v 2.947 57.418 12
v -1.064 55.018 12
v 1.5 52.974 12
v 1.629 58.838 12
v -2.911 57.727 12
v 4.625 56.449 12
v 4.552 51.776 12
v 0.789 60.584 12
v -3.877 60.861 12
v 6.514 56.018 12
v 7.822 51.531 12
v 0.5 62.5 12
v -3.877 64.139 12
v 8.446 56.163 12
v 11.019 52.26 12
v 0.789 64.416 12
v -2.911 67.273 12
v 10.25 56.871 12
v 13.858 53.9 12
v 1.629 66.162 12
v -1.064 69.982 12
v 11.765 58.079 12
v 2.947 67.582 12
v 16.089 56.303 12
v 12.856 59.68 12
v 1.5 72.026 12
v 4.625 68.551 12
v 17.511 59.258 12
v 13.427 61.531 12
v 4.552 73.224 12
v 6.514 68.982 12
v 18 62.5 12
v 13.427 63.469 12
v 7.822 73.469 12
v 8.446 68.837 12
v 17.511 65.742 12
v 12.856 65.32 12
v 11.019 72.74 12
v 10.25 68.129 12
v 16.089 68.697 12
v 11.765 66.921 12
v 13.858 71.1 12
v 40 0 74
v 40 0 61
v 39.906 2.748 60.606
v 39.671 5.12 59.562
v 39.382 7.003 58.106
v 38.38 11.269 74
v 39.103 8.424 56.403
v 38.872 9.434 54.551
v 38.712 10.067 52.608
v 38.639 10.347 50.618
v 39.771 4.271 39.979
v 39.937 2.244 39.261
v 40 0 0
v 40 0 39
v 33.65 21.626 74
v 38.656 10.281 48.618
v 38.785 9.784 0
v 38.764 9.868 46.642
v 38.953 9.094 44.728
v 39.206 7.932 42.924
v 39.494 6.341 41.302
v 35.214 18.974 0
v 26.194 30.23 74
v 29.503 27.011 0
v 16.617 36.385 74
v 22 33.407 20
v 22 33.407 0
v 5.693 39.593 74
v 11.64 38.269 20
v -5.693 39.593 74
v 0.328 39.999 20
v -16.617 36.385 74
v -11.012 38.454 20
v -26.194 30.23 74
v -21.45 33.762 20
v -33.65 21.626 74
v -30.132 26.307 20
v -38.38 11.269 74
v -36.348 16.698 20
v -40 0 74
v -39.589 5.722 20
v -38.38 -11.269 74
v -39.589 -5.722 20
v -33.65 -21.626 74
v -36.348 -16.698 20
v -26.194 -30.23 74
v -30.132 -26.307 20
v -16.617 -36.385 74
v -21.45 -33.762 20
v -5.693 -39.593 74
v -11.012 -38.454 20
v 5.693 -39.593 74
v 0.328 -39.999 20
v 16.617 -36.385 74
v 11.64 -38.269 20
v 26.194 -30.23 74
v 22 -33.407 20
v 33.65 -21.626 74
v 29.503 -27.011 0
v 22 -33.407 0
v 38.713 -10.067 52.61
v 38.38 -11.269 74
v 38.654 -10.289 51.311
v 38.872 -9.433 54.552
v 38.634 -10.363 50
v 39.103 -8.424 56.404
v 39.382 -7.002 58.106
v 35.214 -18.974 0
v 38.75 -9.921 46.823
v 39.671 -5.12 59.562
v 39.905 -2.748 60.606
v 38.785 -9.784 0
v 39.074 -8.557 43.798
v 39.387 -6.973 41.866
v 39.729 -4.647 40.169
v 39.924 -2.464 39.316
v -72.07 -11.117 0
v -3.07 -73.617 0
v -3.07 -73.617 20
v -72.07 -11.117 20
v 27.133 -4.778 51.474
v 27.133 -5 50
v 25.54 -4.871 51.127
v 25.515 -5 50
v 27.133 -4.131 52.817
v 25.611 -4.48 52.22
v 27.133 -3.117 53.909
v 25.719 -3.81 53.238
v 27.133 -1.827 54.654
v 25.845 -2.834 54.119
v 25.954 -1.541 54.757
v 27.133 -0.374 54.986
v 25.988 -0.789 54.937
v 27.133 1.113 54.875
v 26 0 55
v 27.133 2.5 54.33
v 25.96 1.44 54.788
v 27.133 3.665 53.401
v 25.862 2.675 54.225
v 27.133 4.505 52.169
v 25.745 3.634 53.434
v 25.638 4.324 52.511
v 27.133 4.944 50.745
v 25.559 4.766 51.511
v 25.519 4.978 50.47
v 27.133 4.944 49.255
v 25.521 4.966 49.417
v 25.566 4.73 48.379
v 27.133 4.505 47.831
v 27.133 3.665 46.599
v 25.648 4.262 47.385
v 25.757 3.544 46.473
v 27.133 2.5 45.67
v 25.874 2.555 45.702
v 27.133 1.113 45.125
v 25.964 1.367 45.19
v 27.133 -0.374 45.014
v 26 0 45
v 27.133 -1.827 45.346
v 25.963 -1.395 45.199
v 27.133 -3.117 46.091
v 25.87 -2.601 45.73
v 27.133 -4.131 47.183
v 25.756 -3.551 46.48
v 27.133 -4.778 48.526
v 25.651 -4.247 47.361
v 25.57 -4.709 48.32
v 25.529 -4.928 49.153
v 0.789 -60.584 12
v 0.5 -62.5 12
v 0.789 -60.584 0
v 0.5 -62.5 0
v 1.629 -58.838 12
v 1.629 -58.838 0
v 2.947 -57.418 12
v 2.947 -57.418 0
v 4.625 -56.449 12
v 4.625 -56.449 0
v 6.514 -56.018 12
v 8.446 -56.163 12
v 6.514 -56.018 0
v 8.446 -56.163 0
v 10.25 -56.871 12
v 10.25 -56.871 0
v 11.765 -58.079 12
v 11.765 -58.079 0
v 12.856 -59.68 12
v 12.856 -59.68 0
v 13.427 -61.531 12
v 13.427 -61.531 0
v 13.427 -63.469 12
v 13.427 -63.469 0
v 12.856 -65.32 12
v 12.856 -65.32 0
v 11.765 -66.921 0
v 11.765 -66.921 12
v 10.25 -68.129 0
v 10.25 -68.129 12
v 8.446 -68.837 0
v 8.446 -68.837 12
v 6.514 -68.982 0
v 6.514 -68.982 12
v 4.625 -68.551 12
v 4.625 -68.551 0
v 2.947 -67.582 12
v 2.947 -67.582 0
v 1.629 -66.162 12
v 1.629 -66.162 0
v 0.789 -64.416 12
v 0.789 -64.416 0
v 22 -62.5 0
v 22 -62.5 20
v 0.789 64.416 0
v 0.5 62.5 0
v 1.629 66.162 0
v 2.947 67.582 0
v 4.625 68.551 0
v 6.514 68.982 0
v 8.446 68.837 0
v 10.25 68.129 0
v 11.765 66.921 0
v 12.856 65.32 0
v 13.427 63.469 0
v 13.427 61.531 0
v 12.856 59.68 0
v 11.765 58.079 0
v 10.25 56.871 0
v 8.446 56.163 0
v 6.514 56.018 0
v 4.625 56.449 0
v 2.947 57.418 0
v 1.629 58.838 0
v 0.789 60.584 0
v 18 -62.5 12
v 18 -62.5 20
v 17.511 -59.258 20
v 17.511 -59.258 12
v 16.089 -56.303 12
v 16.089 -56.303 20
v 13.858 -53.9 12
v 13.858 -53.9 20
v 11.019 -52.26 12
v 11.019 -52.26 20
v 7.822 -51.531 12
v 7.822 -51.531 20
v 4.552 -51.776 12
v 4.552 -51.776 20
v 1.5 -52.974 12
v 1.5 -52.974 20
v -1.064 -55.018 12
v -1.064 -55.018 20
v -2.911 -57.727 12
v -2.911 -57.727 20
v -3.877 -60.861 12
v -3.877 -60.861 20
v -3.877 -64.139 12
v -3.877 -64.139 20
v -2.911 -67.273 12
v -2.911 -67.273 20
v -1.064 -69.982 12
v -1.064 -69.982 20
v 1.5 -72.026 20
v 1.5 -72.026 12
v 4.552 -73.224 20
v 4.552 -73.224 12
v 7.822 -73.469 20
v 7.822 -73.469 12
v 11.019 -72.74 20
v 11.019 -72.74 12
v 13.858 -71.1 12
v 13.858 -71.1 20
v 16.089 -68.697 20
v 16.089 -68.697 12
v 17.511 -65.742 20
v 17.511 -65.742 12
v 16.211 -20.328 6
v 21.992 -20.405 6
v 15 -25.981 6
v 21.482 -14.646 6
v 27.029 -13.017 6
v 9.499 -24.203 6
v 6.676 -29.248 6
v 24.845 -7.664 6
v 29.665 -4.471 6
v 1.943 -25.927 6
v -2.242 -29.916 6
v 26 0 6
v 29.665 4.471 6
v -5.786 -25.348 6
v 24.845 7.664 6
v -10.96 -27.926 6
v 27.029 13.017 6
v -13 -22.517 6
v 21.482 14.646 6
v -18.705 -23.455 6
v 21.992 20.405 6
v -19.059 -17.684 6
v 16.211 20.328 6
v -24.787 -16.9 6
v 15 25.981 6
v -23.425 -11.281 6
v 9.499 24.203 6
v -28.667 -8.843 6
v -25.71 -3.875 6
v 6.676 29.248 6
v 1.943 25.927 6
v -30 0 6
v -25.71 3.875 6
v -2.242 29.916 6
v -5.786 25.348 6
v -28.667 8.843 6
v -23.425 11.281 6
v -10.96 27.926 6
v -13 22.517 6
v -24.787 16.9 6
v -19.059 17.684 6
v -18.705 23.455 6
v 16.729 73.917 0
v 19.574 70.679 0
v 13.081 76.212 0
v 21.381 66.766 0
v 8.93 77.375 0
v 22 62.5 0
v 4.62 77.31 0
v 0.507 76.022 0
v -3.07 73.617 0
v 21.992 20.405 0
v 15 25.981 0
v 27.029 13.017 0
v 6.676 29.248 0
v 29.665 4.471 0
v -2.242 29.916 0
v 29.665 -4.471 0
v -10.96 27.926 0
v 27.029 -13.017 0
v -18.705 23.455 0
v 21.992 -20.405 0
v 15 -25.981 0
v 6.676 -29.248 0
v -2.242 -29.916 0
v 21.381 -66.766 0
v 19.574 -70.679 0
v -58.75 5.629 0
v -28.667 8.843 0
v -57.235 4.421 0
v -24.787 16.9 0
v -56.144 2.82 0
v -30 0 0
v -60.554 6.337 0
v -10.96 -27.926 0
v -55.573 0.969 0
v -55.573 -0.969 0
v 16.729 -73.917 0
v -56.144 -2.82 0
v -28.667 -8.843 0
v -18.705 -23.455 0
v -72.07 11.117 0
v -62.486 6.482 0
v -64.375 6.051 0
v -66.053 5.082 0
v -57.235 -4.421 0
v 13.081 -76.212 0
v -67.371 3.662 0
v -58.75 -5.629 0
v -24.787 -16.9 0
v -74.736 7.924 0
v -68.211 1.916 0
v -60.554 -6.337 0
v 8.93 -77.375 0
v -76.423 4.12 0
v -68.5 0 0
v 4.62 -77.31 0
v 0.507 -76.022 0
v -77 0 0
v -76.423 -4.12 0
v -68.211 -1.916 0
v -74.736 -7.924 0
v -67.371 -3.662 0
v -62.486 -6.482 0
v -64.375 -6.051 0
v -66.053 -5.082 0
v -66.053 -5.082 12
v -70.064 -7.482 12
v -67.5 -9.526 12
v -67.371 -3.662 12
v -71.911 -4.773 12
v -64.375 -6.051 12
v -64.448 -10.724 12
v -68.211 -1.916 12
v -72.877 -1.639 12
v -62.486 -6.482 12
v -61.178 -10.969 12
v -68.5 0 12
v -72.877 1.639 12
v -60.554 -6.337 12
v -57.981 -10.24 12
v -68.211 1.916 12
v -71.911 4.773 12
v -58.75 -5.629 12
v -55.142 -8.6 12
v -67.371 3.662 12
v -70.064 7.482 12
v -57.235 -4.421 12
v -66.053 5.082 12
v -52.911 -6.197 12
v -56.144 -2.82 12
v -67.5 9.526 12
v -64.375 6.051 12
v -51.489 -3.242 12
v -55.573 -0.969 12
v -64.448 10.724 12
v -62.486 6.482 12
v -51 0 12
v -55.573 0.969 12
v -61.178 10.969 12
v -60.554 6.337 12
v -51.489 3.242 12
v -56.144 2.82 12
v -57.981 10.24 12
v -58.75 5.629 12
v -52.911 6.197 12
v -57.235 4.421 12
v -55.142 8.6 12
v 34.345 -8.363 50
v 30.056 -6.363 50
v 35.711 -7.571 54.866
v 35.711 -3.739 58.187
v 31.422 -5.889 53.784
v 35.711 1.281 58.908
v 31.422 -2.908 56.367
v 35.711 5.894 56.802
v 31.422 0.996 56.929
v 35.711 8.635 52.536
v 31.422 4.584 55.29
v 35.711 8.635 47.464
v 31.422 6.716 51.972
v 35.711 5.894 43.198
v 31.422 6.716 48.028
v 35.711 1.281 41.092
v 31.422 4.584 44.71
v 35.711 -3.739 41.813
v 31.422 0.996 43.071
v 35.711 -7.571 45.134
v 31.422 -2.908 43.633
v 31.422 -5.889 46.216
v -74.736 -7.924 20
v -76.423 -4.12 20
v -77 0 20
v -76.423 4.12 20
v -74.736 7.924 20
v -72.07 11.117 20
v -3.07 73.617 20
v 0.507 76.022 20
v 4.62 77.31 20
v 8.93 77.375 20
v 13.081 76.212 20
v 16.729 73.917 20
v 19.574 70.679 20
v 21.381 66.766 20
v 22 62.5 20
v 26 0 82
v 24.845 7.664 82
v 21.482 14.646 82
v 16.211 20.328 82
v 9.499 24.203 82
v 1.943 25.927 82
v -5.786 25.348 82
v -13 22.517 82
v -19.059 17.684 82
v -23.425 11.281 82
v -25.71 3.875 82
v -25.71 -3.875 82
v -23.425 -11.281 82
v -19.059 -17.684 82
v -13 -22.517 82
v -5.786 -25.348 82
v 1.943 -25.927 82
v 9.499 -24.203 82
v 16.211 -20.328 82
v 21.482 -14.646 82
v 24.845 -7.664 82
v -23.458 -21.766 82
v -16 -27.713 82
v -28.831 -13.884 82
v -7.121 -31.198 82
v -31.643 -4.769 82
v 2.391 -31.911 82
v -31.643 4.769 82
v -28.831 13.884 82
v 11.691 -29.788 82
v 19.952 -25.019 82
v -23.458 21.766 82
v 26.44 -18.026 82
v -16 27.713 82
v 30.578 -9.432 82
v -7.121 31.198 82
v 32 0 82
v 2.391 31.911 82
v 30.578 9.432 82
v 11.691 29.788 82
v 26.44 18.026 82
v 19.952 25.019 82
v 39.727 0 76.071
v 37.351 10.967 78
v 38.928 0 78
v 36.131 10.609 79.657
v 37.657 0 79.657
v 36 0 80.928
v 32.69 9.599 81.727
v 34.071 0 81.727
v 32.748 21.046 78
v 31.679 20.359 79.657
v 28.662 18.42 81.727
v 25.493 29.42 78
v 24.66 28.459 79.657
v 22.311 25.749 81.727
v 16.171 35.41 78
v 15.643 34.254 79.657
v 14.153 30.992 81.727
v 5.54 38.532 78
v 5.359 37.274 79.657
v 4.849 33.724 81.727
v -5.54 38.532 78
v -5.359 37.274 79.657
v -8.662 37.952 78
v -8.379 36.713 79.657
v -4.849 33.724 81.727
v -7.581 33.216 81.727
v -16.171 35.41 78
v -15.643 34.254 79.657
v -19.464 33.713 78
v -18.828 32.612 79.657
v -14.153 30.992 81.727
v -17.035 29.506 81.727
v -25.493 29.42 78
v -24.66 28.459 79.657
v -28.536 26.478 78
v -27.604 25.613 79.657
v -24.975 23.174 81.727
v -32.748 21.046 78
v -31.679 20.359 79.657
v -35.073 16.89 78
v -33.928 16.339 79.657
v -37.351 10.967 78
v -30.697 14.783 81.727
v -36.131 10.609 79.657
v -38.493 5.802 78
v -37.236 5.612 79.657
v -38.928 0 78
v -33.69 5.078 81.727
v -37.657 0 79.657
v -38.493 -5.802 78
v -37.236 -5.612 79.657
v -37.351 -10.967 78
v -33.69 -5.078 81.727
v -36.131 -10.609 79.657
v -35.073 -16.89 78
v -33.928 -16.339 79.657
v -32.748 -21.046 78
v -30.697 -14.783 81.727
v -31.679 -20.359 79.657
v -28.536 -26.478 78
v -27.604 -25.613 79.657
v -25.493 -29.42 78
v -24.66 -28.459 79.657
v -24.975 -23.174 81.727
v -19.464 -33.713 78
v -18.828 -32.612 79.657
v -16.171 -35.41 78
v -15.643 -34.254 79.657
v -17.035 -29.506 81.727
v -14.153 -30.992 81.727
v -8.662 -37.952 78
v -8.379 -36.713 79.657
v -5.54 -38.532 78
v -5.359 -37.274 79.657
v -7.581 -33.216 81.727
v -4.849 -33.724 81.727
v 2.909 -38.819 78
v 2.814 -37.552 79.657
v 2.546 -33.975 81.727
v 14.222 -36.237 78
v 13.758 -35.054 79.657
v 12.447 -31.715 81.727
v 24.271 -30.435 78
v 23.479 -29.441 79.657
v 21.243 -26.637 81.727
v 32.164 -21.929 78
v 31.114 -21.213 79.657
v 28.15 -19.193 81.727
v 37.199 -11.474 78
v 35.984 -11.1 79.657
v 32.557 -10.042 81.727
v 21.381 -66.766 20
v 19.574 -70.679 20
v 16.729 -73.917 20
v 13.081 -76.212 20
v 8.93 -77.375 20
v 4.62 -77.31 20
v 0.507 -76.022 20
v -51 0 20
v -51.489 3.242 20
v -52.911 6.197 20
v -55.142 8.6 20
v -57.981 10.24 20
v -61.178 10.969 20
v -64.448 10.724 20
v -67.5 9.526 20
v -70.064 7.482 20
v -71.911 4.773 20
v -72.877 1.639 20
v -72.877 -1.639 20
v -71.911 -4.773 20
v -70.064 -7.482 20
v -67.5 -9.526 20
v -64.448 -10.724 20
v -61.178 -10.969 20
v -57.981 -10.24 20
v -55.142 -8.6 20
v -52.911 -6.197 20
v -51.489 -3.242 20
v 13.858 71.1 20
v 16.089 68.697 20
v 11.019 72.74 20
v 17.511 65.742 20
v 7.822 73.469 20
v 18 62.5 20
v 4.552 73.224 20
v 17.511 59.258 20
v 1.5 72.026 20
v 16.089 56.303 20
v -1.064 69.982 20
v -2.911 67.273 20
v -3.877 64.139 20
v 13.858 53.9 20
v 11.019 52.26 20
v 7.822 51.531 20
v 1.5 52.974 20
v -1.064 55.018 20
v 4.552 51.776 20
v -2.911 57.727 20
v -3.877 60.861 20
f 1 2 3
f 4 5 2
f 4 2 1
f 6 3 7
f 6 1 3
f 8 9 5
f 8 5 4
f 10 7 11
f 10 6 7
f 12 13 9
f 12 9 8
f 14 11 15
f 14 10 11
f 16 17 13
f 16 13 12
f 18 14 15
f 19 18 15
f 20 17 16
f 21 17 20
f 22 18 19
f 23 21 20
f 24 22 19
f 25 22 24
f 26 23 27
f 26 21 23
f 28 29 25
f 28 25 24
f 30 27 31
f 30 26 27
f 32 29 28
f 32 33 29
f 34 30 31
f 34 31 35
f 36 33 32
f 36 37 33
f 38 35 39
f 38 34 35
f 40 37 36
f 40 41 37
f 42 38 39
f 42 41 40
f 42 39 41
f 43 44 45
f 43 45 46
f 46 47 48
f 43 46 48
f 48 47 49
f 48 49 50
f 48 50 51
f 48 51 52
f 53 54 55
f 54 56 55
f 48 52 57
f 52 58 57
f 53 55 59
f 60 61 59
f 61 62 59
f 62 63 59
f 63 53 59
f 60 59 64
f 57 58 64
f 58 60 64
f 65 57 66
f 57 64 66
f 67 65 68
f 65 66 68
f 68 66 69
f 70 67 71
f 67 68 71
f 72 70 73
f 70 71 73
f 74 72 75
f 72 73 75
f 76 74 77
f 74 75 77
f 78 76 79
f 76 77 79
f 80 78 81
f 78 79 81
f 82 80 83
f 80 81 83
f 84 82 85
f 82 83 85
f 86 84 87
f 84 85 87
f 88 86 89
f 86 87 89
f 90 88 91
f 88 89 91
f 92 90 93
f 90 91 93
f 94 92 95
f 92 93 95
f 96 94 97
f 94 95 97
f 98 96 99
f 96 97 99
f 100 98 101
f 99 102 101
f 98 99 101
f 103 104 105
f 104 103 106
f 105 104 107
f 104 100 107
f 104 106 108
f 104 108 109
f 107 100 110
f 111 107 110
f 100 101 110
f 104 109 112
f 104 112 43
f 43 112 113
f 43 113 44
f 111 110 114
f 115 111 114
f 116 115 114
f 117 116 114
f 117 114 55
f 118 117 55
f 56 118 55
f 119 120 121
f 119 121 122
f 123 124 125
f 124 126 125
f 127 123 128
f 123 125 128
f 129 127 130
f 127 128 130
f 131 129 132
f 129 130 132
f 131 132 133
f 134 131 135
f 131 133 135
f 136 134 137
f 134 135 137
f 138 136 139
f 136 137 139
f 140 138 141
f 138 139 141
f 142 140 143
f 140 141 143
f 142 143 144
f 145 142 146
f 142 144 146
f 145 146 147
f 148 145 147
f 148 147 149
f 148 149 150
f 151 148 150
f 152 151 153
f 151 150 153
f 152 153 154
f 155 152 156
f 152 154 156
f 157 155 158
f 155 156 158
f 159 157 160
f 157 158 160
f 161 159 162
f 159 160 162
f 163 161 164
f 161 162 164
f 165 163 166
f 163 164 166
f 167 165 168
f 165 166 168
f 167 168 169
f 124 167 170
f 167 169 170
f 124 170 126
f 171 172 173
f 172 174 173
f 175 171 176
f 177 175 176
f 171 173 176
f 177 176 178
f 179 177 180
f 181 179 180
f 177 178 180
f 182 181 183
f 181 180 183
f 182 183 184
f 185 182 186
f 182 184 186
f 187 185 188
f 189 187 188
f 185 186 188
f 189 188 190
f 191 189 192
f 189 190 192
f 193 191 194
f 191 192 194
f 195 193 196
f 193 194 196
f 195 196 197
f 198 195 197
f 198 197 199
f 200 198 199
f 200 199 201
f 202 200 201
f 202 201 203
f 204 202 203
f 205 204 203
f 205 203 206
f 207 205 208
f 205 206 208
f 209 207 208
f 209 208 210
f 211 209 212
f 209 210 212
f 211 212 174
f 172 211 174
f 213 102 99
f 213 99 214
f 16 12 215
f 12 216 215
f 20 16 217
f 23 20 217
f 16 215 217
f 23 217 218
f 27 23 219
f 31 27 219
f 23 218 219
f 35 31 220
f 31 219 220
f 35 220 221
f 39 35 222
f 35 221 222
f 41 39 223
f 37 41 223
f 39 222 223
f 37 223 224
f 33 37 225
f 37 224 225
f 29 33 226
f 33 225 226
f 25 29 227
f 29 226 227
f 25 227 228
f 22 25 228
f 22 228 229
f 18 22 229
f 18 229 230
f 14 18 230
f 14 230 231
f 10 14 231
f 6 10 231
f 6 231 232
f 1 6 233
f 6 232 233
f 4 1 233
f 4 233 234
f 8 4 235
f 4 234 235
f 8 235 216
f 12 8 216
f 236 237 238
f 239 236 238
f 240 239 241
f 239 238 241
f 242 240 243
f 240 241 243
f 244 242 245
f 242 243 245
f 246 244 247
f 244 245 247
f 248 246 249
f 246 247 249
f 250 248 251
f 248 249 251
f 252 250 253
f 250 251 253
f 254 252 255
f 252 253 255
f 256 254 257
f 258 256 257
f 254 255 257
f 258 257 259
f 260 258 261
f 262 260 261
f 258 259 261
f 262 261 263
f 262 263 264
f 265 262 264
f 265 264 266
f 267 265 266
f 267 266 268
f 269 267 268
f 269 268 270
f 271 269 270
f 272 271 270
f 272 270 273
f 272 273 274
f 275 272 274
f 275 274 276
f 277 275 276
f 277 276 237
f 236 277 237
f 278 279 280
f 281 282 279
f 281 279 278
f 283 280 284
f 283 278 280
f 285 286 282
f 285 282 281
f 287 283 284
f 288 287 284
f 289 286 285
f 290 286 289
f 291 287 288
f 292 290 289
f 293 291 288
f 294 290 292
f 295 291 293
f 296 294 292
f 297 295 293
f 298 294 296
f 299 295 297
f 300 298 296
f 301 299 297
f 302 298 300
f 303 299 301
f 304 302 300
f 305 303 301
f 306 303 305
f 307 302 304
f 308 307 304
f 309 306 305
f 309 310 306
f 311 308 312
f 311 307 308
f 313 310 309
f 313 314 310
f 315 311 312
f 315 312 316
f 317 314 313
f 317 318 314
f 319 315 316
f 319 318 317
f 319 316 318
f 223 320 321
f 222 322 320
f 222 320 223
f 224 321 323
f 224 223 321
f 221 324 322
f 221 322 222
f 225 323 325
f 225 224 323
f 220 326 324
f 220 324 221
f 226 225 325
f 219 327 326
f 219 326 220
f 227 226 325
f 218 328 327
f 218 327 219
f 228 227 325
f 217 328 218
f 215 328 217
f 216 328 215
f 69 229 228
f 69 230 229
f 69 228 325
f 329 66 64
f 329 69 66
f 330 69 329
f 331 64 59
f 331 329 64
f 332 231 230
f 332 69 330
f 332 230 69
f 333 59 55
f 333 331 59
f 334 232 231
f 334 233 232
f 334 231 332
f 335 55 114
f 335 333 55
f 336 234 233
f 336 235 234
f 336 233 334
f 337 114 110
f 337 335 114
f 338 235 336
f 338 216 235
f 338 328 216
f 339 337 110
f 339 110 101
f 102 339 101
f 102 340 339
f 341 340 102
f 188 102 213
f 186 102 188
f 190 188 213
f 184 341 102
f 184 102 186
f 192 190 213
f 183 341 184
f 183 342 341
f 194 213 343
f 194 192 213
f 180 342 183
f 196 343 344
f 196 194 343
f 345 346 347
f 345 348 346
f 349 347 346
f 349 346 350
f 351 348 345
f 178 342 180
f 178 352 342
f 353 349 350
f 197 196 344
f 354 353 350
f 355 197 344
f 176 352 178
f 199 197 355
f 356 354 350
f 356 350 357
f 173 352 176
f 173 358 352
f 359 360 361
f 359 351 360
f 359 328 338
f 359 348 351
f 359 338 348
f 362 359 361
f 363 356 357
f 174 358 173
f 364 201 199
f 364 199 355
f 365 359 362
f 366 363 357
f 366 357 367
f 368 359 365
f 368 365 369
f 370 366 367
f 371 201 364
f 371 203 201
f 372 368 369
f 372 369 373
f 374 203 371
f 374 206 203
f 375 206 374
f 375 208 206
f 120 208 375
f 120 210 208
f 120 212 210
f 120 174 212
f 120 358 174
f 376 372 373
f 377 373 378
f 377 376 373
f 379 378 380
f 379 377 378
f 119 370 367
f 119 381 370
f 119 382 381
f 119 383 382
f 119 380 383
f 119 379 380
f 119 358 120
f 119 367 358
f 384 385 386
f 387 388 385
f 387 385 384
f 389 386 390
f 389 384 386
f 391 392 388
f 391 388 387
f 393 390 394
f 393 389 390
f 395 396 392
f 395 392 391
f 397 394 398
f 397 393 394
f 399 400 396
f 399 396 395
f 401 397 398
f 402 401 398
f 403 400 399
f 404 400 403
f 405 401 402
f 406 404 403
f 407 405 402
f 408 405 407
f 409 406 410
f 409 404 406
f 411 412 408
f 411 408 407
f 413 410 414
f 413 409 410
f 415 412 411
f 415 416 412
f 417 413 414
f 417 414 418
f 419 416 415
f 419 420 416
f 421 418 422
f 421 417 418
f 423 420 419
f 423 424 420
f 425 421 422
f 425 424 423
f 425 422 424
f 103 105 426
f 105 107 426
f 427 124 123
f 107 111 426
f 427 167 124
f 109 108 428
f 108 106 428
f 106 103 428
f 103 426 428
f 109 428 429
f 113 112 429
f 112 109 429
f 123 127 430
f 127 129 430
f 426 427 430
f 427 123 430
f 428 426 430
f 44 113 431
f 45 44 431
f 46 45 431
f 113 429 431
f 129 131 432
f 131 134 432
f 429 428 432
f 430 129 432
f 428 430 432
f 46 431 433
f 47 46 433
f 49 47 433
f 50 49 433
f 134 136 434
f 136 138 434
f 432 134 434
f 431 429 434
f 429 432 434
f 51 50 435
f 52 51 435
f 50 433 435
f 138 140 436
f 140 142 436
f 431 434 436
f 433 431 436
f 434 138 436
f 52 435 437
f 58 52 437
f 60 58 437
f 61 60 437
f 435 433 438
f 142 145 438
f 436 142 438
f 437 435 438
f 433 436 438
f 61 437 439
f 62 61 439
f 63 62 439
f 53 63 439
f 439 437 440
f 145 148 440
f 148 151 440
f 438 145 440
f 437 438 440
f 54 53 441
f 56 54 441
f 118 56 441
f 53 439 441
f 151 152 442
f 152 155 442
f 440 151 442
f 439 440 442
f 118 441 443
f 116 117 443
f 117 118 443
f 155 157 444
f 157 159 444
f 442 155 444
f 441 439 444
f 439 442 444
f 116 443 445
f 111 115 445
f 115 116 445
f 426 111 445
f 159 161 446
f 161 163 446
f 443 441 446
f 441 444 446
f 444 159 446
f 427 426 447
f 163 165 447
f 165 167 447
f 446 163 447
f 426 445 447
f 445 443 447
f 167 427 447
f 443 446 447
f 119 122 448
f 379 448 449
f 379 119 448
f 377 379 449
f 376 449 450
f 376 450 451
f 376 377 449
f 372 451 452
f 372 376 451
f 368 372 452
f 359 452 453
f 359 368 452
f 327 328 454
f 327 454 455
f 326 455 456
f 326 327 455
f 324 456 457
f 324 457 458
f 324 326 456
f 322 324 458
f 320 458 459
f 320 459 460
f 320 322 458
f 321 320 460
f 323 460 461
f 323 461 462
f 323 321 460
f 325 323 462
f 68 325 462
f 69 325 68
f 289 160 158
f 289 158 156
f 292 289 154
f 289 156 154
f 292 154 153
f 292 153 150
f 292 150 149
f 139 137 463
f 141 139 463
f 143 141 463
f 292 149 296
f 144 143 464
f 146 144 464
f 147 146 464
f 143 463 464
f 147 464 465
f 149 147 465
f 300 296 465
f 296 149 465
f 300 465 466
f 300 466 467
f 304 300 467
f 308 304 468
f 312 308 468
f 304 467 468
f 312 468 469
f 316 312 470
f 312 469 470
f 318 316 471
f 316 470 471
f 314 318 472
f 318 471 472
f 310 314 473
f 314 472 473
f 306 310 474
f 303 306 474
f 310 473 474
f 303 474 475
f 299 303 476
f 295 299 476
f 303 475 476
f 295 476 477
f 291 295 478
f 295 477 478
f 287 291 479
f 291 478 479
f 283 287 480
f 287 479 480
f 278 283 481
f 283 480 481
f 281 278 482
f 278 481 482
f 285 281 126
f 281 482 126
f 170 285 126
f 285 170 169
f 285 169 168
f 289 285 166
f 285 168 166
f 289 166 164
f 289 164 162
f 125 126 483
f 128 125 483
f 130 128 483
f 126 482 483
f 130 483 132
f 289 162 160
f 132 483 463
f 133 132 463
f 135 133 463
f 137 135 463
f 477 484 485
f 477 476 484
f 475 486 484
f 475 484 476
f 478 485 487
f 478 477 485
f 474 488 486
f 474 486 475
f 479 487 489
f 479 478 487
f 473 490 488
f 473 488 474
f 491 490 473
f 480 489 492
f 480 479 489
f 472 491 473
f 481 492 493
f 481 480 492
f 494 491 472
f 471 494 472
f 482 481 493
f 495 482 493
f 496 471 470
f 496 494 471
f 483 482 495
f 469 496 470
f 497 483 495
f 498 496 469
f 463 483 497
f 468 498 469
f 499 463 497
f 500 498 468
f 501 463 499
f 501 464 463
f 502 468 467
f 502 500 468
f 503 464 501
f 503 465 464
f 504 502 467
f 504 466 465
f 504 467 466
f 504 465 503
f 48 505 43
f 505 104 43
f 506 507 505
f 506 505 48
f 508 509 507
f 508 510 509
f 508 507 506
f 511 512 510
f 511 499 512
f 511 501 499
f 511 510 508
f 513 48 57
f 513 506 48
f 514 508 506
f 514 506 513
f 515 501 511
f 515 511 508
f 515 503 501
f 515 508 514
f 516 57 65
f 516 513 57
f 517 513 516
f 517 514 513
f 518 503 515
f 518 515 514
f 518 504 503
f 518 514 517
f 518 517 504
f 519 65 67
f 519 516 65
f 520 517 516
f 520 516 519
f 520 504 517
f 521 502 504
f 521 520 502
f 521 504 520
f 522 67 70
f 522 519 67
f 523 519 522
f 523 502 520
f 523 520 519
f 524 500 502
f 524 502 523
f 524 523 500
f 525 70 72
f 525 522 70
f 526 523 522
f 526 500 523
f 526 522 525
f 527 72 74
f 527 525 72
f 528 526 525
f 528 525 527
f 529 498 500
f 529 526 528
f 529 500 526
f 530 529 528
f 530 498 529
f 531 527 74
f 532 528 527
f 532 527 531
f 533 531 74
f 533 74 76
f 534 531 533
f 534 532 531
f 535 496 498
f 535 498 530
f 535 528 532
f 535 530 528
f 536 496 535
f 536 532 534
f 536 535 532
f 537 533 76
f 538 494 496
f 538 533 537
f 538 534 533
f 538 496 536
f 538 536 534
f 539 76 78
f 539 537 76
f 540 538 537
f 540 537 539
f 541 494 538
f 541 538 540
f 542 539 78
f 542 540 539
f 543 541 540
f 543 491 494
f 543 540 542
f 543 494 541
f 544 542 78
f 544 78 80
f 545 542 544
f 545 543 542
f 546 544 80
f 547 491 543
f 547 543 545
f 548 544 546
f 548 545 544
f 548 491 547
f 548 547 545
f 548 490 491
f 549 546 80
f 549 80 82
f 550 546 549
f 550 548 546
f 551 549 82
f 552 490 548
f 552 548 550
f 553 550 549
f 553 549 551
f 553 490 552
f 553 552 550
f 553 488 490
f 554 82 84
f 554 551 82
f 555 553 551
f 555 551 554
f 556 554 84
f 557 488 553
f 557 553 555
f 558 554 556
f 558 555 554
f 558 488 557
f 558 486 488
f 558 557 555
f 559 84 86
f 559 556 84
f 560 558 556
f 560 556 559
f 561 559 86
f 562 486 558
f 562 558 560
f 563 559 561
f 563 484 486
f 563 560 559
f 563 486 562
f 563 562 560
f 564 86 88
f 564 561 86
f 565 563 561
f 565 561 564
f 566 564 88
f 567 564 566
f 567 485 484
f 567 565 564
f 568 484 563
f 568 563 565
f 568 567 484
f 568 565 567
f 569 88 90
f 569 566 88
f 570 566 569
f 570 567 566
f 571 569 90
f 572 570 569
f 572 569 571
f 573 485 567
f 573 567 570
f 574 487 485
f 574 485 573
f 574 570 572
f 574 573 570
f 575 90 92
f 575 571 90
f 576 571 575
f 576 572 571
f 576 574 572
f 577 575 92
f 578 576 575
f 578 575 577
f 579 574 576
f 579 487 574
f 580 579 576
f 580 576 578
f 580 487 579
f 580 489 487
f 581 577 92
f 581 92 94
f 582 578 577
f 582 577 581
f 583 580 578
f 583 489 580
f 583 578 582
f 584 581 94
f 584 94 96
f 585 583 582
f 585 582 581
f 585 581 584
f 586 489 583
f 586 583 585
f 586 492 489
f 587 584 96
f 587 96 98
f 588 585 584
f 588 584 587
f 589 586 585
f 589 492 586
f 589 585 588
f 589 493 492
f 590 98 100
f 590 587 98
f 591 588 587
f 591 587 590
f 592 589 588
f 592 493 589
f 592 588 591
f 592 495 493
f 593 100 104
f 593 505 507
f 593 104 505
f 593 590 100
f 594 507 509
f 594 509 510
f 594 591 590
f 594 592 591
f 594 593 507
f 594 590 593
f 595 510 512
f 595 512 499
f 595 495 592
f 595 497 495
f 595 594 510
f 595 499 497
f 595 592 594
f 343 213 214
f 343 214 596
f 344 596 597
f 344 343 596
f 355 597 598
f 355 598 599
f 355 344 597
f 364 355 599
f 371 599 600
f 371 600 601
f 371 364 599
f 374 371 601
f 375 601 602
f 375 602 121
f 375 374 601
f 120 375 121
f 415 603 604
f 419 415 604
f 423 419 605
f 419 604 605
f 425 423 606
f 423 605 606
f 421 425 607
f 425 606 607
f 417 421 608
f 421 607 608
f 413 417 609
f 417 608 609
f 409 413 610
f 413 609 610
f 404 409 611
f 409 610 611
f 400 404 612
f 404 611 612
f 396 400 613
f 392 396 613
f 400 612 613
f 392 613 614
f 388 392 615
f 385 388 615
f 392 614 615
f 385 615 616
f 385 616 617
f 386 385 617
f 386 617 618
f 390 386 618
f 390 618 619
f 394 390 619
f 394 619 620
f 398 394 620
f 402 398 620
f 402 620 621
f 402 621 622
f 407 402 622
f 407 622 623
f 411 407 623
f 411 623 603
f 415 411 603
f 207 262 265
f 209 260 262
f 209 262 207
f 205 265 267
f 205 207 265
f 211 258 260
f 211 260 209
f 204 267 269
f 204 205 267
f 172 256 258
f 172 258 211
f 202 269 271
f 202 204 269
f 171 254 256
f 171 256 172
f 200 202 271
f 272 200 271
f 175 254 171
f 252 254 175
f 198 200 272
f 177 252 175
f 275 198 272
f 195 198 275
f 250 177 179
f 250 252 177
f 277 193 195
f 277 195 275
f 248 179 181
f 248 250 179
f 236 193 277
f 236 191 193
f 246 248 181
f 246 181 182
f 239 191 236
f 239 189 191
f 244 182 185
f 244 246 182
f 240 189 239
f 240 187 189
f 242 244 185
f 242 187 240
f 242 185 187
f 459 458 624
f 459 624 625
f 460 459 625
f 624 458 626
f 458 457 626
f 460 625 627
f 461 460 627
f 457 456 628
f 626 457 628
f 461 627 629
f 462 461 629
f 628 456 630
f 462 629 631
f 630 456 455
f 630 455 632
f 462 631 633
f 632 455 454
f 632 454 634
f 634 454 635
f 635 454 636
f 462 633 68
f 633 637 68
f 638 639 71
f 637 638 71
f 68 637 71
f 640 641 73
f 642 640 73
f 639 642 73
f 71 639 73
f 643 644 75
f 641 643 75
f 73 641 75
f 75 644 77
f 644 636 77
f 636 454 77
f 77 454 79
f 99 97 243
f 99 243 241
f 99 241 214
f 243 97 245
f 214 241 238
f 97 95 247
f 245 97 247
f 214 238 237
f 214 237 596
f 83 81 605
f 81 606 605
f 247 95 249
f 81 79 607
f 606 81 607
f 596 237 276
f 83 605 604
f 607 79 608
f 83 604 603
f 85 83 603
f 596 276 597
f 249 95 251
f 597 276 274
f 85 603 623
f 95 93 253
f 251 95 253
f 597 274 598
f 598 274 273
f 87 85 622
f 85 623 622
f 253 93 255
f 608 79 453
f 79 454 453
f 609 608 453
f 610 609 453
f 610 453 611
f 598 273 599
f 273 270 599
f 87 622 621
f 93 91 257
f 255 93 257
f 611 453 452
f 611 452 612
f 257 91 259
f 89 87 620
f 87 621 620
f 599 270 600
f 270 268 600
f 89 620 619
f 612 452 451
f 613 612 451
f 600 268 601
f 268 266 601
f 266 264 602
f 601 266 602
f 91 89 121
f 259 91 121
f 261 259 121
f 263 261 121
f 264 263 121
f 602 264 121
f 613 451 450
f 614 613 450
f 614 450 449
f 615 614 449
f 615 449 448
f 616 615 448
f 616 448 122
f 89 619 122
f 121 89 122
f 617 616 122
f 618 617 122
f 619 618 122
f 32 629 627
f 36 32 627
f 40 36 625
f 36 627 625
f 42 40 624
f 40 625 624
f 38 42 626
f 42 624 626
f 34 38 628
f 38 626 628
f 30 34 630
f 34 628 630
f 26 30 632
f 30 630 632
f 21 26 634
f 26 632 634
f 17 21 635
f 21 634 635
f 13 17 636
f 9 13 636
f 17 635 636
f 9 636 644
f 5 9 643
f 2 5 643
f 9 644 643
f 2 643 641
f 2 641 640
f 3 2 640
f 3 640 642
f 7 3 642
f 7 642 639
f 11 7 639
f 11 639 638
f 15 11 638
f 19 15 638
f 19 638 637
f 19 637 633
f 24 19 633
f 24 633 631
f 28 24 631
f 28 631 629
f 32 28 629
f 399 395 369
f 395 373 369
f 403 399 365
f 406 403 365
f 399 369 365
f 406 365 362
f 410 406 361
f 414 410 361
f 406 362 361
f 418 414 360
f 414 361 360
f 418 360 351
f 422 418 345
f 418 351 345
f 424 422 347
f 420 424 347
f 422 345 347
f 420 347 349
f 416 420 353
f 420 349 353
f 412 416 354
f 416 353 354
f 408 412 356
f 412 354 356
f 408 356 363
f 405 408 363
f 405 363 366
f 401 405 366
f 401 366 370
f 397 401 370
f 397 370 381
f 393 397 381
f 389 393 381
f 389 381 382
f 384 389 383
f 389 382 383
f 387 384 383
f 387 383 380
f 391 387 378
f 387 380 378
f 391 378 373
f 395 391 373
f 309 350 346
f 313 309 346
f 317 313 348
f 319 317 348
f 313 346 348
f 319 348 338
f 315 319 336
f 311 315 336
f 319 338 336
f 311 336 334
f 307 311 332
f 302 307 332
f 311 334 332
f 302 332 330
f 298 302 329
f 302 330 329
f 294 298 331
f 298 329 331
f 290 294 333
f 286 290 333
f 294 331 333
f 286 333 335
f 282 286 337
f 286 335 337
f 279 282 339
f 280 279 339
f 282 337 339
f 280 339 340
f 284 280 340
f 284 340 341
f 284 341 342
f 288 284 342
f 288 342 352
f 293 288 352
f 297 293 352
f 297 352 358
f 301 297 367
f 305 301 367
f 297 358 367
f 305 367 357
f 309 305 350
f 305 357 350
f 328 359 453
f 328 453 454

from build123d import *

# Parameters (mm, degrees)
SKETCH1_R                                         = 40
SKETCH1_R_2                                       = 26
BOSS_EXTRUDE1_DEPTH                               = 82
BOSS_EXTRUDE2_DEPTH                               = 20
SKETCH4_R                                         = 26
CUT_EXTRUDE1_DEPTH                                = 22
CBORE_FOR_M10_HEX_HEAD_BOLT2_D                    = 13
CBORE_FOR_M10_HEX_HEAD_BOLT2_CBORE_D              = 22
CBORE_FOR_M10_HEX_HEAD_BOLT2_CBORE_DEPTH          = 8
FILLET1_R                                         = 8
CSK_FOR_M10_FLAT_HEAD_MACHINE_SCREW12_D           = 10
CSK_FOR_M10_FLAT_HEAD_MACHINE_SCREW12_DEPTH       = 30
CSK_FOR_M10_FLAT_HEAD_MACHINE_SCREW12_CSINK_D     = 22
CSK_FOR_M10_FLAT_HEAD_MACHINE_SCREW12_CSINK_ANGLE = 50
CSK_FOR_M10_FLAT_HEAD_MACHINE_SCREW12_TIP         = 3.004303095
SKETCH22_R                                        = 30
CUT_EXTRUDE2_DEPTH                                = 6


with BuildPart() as part:
    # Sketch1 → Boss-Extrude1 (new body)
    with BuildSketch(Plane(origin=(0, 0, 0), x_dir=(0, 1, 0), z_dir=(0, 0, 1))):
        with Locations(Location((0, 0, 0), (0, 0, 270))):
            Circle(SKETCH1_R)
        with Locations(Location((0, 0, 0), (0, 0, 270))):
            Circle(SKETCH1_R_2, mode=Mode.SUBTRACT)
    extrude(amount=BOSS_EXTRUDE1_DEPTH)

    # Sketch2 → Boss-Extrude2 (add)
    with BuildSketch(Plane(origin=(0, 0, 0), x_dir=(0, 1, 0), z_dir=(0, 0, 1))):
        with BuildLine():
            Line((-73.617309286, 3.070026527), (-11.117309286, 72.070026527))
            ThreePointArc((-11.117309286, 72.070026527), (0, 77), (11.117309286, 72.070026527))
            Line((11.117309286, 72.070026527), (73.617309286, 3.070026527))
            ThreePointArc((73.617309286, 3.070026527), (76.212228081, -13.080690837), (62.5, -22))
            Line((62.5, -22), (33.406586177, -22))
            ThreePointArc((33.406586177, -22), (0, -40), (-33.406586177, -22))
            Line((-33.406586177, -22), (-62.5, -22))
            ThreePointArc((-62.5, -22), (-76.212228081, -13.080690837), (-73.617309286, 3.070026527))
        make_face()
    extrude(amount=BOSS_EXTRUDE2_DEPTH)

    # Sketch4 → Cut-Extrude1 (cut)
    with BuildSketch(Plane.XY.offset(20)):
        Circle(SKETCH4_R)
    extrude(amount=-CUT_EXTRUDE1_DEPTH, mode=Mode.SUBTRACT)

    # CBORE for M10 Hex Head Bolt2 (through all)
    with Locations(Plane(origin=(-62, 0, 20), x_dir=(1, 0, 0), z_dir=(0, 0, 1))):
        with Locations((0, 0), (69, 62.5), (69, -62.5)):
            CounterBoreHole(CBORE_FOR_M10_HEX_HEAD_BOLT2_D / 2, CBORE_FOR_M10_HEX_HEAD_BOLT2_CBORE_D / 2, CBORE_FOR_M10_HEX_HEAD_BOLT2_CBORE_DEPTH)

    # Fillet1
    fillet1_edges = [part.edges().sort_by_distance(p)[0] for p in [
        (-40, 0, 82),
    ]]
    fillet(fillet1_edges, radius=FILLET1_R)

    # CSK for M10 Flat Head Machine Screw12
    with Locations(Plane.YZ.offset(40)):
        with Locations((0, 50)):
            CounterSinkHole(CSK_FOR_M10_FLAT_HEAD_MACHINE_SCREW12_D / 2, CSK_FOR_M10_FLAT_HEAD_MACHINE_SCREW12_CSINK_D / 2, depth=CSK_FOR_M10_FLAT_HEAD_MACHINE_SCREW12_DEPTH, counter_sink_angle=CSK_FOR_M10_FLAT_HEAD_MACHINE_SCREW12_CSINK_ANGLE)
            with Locations((0, 0, -(CSK_FOR_M10_FLAT_HEAD_MACHINE_SCREW12_DEPTH + CSK_FOR_M10_FLAT_HEAD_MACHINE_SCREW12_TIP / 2))):  # 118° drill point
                Cone(0, CSK_FOR_M10_FLAT_HEAD_MACHINE_SCREW12_D / 2, CSK_FOR_M10_FLAT_HEAD_MACHINE_SCREW12_TIP, mode=Mode.SUBTRACT)

    # Sketch22 → Cut-Extrude2 (cut)
    with BuildSketch(Plane(origin=(0, 0, 0), x_dir=(1, 0, 0), z_dir=(0, 0, -1))):
        with Locations(Location((0, 0, 0), (0, 0, 180))):
            Circle(SKETCH22_R)
    extrude(amount=-CUT_EXTRUDE2_DEPTH, mode=Mode.SUBTRACT)


solid = part.part
